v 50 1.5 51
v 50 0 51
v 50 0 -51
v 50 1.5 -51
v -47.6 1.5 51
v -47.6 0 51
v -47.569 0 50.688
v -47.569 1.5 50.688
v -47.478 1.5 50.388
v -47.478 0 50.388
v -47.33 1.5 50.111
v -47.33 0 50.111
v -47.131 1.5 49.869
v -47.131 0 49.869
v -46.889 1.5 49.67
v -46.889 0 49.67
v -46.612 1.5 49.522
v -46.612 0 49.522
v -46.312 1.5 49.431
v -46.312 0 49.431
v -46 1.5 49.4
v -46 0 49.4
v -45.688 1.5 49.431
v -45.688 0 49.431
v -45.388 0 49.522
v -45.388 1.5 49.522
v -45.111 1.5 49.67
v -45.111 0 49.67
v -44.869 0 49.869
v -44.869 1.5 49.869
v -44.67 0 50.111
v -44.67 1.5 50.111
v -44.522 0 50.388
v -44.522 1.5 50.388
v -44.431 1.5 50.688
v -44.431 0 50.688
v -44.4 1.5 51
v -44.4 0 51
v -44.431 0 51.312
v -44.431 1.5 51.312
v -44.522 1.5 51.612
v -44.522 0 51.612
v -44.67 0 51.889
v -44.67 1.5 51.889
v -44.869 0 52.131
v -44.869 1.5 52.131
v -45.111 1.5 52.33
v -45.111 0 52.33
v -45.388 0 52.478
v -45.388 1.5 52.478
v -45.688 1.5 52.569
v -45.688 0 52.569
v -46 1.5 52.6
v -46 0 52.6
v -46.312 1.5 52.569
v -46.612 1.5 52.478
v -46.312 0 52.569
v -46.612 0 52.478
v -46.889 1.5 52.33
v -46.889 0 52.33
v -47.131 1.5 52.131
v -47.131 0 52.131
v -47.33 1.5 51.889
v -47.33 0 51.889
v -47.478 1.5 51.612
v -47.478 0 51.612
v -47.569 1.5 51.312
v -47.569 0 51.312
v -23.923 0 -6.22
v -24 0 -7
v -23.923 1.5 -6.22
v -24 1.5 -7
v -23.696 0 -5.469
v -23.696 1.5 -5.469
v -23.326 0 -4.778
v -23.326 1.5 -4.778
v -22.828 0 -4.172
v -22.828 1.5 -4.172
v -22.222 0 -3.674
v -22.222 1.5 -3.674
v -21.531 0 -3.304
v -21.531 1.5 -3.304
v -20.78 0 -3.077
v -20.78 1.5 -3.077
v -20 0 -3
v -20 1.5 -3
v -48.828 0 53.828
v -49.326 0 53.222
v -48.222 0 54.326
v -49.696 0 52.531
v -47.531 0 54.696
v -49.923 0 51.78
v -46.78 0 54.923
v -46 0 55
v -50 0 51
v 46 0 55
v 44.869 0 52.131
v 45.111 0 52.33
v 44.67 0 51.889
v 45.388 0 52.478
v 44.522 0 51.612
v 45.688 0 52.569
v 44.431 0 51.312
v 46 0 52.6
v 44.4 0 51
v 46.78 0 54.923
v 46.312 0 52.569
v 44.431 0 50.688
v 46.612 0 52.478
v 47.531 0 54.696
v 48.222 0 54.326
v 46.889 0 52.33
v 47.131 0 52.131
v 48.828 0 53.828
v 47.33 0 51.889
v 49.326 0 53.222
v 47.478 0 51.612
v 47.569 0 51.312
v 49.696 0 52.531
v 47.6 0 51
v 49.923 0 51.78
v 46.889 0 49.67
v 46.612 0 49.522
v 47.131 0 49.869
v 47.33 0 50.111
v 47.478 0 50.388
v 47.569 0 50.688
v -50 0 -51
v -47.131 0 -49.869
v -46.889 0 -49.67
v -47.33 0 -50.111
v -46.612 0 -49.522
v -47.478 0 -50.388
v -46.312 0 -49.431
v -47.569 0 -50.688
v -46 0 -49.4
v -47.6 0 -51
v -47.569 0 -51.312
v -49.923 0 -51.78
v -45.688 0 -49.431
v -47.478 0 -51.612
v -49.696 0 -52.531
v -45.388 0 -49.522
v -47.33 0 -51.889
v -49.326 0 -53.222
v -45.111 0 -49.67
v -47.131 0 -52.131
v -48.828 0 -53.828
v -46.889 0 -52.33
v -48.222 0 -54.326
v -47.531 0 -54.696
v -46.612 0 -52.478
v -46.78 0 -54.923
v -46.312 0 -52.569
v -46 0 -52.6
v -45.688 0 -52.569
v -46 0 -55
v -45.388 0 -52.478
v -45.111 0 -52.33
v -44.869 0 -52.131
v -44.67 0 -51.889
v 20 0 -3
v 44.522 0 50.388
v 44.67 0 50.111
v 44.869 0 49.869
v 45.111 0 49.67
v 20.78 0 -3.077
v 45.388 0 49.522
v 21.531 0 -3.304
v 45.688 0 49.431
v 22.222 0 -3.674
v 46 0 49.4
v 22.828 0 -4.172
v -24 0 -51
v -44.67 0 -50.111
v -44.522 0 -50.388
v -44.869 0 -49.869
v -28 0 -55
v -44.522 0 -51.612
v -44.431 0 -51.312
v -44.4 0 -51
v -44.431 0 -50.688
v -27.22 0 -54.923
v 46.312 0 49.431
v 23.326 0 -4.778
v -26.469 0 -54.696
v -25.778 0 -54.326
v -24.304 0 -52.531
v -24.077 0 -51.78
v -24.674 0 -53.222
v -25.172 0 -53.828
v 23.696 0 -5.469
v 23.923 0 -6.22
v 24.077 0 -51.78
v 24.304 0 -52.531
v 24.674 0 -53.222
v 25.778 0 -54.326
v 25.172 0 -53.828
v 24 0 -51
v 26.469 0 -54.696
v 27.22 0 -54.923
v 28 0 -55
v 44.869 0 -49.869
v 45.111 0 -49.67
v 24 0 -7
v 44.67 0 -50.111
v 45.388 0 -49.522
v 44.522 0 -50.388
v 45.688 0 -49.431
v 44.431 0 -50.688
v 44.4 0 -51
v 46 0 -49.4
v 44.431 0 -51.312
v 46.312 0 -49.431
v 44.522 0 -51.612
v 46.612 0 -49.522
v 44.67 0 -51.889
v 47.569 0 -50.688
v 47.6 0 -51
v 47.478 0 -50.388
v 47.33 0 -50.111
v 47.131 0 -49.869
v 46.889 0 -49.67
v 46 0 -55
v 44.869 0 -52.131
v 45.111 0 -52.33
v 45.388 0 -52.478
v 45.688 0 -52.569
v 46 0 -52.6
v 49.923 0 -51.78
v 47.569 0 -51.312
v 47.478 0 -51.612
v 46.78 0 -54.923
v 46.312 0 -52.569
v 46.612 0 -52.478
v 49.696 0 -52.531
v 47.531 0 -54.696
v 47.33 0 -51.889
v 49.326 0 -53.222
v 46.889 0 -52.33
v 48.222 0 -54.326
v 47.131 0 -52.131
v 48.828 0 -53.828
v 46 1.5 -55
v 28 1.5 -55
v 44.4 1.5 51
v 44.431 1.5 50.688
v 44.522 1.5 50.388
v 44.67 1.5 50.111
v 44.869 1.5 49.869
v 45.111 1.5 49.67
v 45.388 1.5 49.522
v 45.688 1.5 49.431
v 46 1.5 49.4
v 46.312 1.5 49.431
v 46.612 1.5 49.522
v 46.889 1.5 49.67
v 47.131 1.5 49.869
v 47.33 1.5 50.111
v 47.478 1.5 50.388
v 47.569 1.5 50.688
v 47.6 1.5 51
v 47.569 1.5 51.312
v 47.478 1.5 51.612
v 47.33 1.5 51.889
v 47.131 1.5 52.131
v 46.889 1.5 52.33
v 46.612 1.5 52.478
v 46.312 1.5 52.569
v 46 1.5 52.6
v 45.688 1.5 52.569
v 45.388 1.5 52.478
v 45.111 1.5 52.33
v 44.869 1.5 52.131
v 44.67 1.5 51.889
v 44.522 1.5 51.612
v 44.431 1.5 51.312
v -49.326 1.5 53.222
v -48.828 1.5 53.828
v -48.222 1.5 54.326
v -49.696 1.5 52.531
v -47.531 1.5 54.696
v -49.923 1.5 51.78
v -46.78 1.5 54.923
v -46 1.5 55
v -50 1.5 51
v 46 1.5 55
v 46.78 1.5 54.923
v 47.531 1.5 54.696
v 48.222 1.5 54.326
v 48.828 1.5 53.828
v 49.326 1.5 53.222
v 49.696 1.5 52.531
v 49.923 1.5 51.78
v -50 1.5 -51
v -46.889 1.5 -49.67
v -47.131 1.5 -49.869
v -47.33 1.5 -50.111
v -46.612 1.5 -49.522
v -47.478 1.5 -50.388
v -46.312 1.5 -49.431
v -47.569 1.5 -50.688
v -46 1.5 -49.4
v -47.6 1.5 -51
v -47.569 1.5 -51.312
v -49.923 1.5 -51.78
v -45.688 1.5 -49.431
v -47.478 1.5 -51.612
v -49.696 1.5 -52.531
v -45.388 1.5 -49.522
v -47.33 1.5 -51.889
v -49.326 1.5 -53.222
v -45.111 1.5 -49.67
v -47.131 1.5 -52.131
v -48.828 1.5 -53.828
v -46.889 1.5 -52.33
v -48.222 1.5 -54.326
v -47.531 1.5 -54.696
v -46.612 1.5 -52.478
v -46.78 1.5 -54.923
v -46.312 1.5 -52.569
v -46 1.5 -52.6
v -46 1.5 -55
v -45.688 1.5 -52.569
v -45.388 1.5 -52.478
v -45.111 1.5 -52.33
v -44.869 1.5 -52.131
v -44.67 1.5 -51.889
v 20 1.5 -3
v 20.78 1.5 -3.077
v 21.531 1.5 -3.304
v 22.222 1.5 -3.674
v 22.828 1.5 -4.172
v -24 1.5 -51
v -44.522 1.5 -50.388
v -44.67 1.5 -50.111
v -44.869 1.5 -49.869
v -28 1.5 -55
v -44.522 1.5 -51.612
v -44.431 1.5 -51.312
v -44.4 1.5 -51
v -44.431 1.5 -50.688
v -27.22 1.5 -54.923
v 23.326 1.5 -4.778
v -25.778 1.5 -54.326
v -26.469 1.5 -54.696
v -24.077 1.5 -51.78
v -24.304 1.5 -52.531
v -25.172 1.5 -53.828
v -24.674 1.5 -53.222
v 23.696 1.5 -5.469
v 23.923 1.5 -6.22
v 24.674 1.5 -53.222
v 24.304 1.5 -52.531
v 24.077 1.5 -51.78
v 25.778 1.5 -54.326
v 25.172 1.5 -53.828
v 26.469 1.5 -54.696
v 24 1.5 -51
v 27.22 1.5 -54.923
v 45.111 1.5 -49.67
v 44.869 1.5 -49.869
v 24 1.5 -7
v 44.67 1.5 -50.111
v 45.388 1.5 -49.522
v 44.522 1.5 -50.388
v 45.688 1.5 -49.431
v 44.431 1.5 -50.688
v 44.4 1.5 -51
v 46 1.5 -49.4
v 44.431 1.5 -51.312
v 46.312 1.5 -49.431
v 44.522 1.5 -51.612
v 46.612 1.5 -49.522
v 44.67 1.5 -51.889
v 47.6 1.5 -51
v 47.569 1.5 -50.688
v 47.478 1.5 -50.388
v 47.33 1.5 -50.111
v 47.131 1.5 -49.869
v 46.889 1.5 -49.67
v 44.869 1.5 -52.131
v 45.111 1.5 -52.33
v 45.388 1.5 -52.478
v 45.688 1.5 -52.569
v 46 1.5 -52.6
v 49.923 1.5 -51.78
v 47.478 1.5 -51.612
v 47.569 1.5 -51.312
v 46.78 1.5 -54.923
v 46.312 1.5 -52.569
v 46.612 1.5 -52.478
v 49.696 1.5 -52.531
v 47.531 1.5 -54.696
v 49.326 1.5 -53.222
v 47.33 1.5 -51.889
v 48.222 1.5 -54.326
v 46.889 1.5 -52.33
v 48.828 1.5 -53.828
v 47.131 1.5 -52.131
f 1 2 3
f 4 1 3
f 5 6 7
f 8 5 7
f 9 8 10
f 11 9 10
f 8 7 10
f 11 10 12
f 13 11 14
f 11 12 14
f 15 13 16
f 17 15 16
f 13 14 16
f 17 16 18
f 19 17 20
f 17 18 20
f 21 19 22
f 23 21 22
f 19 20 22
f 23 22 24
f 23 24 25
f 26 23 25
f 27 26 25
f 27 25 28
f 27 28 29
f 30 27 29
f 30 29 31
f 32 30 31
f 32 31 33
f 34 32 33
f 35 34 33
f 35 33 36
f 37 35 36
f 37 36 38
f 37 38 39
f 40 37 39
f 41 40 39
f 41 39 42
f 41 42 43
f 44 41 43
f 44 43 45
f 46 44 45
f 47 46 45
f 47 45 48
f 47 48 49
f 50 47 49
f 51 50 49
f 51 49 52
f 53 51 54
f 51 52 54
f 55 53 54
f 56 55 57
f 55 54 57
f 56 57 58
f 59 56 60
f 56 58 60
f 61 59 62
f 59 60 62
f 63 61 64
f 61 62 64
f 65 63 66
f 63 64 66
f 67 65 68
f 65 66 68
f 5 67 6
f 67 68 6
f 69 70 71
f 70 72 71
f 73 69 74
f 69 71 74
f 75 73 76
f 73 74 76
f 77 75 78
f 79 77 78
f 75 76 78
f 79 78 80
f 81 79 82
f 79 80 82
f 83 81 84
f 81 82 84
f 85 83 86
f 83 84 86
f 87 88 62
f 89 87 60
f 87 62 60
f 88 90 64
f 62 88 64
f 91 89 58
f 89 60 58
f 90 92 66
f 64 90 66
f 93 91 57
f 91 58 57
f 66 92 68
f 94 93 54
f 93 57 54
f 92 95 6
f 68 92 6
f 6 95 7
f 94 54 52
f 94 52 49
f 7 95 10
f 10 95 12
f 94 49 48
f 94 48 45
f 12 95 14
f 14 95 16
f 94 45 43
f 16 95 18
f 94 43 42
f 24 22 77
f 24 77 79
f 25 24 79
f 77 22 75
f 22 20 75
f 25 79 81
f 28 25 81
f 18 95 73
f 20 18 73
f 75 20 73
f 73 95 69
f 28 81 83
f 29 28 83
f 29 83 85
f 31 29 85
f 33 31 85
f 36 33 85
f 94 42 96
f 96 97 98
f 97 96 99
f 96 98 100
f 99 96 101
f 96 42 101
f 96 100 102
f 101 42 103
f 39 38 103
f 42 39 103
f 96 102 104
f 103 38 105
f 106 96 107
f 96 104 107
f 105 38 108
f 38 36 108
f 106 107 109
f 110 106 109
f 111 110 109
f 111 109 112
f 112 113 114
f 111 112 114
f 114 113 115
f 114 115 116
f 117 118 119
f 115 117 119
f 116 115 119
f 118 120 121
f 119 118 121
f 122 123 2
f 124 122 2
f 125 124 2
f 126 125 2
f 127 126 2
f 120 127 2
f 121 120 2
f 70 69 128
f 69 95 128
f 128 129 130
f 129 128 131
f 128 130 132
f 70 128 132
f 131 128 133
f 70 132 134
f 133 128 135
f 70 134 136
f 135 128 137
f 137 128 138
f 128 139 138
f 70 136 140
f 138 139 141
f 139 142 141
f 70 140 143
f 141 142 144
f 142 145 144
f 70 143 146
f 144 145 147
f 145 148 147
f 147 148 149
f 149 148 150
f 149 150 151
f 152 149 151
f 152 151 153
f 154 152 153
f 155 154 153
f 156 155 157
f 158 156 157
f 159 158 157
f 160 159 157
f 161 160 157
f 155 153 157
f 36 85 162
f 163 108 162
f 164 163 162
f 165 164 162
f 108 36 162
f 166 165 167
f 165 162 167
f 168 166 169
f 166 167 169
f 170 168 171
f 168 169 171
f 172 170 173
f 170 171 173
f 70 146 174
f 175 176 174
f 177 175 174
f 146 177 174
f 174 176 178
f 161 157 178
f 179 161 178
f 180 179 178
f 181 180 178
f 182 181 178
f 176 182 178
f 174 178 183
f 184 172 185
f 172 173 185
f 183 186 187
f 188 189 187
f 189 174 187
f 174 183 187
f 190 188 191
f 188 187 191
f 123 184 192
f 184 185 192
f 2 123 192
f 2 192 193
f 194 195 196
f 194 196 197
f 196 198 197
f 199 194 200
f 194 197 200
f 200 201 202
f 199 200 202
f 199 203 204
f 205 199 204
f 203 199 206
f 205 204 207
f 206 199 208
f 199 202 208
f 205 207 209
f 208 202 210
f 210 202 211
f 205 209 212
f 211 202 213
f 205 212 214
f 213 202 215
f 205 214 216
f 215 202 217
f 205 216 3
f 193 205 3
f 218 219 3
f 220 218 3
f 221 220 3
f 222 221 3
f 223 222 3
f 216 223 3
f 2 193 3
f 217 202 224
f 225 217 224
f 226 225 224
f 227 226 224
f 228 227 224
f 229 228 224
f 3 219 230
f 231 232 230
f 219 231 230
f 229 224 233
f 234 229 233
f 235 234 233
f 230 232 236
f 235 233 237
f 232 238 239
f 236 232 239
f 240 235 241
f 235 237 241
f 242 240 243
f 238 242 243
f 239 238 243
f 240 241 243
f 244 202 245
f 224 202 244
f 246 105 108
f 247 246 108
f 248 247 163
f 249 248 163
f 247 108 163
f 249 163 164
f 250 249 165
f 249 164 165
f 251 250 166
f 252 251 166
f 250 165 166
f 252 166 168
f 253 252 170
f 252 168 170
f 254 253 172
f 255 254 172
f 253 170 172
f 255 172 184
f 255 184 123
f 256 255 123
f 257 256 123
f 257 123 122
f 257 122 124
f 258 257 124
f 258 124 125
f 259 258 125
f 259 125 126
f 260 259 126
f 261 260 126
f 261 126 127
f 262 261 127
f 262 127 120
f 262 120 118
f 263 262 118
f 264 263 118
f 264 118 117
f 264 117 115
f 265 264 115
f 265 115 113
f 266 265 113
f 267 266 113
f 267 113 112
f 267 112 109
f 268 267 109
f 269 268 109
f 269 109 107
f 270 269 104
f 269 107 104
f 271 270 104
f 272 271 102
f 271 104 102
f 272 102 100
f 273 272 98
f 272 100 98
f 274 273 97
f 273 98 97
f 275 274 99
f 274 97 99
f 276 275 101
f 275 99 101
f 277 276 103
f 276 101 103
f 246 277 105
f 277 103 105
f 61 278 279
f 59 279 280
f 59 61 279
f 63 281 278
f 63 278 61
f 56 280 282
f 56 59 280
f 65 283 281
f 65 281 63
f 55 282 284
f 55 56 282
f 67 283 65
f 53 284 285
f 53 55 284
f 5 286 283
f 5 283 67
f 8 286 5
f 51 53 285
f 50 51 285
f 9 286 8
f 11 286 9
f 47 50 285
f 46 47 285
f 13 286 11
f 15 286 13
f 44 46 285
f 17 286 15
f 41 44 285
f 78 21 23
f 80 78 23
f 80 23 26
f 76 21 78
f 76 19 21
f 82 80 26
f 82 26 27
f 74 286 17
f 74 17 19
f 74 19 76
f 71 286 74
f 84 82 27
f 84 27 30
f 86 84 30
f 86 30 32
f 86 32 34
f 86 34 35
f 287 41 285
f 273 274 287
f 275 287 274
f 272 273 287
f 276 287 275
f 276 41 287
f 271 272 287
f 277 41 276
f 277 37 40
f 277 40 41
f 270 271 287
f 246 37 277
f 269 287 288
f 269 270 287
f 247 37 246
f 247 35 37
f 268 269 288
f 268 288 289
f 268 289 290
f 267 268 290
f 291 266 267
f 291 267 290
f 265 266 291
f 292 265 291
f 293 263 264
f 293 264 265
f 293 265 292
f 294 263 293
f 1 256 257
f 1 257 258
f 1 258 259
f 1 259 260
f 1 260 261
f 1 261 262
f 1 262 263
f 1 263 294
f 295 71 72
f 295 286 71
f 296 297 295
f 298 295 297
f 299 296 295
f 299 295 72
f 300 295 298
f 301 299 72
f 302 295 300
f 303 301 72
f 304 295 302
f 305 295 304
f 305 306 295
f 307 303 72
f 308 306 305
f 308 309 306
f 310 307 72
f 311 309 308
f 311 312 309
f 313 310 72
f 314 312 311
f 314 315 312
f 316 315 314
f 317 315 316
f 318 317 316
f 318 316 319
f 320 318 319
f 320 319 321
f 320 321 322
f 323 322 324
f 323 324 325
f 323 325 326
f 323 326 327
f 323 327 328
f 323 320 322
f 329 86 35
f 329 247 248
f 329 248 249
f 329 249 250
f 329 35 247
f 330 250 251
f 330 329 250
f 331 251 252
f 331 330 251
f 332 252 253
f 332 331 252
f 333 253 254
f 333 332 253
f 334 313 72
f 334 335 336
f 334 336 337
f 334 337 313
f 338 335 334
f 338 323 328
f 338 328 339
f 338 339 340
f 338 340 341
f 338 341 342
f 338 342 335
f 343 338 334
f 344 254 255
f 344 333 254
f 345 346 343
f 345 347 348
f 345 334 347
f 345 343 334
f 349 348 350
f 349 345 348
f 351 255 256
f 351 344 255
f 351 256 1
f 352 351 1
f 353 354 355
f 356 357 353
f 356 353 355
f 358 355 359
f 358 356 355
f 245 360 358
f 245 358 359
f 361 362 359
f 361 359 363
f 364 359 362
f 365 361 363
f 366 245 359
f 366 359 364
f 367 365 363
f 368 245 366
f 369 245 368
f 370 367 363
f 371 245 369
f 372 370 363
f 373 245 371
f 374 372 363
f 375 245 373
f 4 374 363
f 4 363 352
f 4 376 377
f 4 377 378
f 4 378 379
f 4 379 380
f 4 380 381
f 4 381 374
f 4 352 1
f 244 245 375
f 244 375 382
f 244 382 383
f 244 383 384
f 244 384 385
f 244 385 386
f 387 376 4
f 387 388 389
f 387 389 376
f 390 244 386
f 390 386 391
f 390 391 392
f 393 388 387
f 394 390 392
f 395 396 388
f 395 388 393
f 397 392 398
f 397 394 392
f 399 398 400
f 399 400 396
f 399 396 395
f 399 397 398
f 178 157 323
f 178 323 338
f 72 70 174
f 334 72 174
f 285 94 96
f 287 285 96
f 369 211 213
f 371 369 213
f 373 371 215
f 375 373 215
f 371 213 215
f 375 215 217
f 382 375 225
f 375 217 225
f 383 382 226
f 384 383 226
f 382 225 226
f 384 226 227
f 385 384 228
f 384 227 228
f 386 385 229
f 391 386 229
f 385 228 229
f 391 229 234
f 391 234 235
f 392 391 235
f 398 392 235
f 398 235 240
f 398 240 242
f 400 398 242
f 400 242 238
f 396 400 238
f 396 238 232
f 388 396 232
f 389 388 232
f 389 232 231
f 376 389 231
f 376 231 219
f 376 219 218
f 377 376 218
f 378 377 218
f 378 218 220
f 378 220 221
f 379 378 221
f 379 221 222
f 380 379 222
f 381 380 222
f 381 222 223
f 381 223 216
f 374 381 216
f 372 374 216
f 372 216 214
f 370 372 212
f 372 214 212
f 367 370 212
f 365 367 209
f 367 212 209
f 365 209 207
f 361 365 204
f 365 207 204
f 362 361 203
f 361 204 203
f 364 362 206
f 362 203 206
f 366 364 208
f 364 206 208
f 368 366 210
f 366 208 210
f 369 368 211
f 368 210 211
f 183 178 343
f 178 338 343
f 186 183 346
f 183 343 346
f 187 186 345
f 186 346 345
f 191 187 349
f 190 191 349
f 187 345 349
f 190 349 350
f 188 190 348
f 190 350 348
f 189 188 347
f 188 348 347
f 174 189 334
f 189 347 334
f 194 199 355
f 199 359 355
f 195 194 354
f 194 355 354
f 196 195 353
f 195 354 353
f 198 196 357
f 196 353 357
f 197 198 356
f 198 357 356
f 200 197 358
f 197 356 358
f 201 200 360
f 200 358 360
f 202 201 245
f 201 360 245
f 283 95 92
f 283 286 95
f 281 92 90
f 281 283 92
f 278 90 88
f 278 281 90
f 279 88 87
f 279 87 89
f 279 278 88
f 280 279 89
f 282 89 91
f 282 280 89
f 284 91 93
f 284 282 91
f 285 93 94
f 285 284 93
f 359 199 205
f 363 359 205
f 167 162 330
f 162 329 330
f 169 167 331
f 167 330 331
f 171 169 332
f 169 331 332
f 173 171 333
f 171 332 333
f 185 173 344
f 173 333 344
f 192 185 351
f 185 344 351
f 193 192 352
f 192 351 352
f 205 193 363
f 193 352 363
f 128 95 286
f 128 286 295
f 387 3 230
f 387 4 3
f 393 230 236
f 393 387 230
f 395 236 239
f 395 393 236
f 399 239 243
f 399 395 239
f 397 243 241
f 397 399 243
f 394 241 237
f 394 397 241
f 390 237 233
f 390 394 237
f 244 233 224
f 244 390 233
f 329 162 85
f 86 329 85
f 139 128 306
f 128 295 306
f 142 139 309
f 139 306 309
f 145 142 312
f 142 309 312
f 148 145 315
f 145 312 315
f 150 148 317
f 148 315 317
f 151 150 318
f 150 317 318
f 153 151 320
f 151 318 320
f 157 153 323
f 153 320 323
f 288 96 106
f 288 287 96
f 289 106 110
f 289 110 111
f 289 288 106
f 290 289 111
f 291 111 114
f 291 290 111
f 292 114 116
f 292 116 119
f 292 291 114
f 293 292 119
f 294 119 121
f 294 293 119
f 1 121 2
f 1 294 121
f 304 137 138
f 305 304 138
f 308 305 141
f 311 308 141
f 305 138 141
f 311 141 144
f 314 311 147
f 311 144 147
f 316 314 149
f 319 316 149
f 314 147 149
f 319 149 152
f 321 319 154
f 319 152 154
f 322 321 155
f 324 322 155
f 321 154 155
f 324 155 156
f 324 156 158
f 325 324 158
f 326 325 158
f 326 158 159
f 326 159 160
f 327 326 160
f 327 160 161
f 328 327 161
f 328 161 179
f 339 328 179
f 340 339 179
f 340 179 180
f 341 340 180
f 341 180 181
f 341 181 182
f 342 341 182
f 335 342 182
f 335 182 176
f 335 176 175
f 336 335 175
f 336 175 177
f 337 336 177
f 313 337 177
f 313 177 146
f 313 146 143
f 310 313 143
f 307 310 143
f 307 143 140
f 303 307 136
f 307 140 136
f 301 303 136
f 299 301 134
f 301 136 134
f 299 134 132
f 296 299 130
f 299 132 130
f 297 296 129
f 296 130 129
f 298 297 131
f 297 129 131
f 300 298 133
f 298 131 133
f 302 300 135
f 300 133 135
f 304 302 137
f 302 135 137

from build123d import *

# Parameters (mm, degrees)
SKETCH1_W           = 100
SKETCH1_H           = 110
BOSS_EXTRUDE1_DEPTH = 1.5
CUT_EXTRUDE1_DEPTH  = 10
FILLET1_R           = 4
SKETCH4_R           = 1.6
CUT_EXTRUDE2_DEPTH  = 10


with BuildPart() as part:
    # Sketch1 → Boss-Extrude1 (new body)
    with BuildSketch(Plane(origin=(0, 0, 0), x_dir=(1, 0, 0), z_dir=(0, 1, 0))):
        Rectangle(SKETCH1_W, SKETCH1_H)
    extrude(amount=BOSS_EXTRUDE1_DEPTH)

    # Sketch2 → Cut-Extrude1 (cut)
    with BuildSketch(Plane(origin=(0, 0, 0), x_dir=(-1, 0, 0), z_dir=(0, -1, 0))):
        Polygon((0, 55), (-24, 55), (-24, 3), (24, 3), (24, 55), align=None)
    extrude(amount=-CUT_EXTRUDE1_DEPTH, mode=Mode.SUBTRACT)

    # Fillet1
    fillet1_edges = [part.edges().sort_by_distance(p)[0] for p in [
        (-24, 0.75, -55),
        (-24, 0.75, -3),
        (24, 0.75, -3),
        (24, 0.75, -55),
        (50, 0.75, 55),
        (-50, 0.75, 55),
        (-50, 0.75, -55),
        (50, 0.75, -55),
    ]]
    fillet(fillet1_edges, radius=FILLET1_R)

    # Sketch4 → Cut-Extrude2 (cut)
    with BuildSketch(Plane(origin=(0, 0, 0), x_dir=(-1, 0, 0), z_dir=(0, -1, 0))):
        with Locations((46, -51)):
            Circle(SKETCH4_R)
        with Locations((46, 51)):
            Circle(SKETCH4_R)
        with Locations((-46, 51)):
            Circle(SKETCH4_R)
        with Locations((-46, -51)):
            Circle(SKETCH4_R)
    extrude(amount=-CUT_EXTRUDE2_DEPTH, mode=Mode.SUBTRACT)


solid = part.part
